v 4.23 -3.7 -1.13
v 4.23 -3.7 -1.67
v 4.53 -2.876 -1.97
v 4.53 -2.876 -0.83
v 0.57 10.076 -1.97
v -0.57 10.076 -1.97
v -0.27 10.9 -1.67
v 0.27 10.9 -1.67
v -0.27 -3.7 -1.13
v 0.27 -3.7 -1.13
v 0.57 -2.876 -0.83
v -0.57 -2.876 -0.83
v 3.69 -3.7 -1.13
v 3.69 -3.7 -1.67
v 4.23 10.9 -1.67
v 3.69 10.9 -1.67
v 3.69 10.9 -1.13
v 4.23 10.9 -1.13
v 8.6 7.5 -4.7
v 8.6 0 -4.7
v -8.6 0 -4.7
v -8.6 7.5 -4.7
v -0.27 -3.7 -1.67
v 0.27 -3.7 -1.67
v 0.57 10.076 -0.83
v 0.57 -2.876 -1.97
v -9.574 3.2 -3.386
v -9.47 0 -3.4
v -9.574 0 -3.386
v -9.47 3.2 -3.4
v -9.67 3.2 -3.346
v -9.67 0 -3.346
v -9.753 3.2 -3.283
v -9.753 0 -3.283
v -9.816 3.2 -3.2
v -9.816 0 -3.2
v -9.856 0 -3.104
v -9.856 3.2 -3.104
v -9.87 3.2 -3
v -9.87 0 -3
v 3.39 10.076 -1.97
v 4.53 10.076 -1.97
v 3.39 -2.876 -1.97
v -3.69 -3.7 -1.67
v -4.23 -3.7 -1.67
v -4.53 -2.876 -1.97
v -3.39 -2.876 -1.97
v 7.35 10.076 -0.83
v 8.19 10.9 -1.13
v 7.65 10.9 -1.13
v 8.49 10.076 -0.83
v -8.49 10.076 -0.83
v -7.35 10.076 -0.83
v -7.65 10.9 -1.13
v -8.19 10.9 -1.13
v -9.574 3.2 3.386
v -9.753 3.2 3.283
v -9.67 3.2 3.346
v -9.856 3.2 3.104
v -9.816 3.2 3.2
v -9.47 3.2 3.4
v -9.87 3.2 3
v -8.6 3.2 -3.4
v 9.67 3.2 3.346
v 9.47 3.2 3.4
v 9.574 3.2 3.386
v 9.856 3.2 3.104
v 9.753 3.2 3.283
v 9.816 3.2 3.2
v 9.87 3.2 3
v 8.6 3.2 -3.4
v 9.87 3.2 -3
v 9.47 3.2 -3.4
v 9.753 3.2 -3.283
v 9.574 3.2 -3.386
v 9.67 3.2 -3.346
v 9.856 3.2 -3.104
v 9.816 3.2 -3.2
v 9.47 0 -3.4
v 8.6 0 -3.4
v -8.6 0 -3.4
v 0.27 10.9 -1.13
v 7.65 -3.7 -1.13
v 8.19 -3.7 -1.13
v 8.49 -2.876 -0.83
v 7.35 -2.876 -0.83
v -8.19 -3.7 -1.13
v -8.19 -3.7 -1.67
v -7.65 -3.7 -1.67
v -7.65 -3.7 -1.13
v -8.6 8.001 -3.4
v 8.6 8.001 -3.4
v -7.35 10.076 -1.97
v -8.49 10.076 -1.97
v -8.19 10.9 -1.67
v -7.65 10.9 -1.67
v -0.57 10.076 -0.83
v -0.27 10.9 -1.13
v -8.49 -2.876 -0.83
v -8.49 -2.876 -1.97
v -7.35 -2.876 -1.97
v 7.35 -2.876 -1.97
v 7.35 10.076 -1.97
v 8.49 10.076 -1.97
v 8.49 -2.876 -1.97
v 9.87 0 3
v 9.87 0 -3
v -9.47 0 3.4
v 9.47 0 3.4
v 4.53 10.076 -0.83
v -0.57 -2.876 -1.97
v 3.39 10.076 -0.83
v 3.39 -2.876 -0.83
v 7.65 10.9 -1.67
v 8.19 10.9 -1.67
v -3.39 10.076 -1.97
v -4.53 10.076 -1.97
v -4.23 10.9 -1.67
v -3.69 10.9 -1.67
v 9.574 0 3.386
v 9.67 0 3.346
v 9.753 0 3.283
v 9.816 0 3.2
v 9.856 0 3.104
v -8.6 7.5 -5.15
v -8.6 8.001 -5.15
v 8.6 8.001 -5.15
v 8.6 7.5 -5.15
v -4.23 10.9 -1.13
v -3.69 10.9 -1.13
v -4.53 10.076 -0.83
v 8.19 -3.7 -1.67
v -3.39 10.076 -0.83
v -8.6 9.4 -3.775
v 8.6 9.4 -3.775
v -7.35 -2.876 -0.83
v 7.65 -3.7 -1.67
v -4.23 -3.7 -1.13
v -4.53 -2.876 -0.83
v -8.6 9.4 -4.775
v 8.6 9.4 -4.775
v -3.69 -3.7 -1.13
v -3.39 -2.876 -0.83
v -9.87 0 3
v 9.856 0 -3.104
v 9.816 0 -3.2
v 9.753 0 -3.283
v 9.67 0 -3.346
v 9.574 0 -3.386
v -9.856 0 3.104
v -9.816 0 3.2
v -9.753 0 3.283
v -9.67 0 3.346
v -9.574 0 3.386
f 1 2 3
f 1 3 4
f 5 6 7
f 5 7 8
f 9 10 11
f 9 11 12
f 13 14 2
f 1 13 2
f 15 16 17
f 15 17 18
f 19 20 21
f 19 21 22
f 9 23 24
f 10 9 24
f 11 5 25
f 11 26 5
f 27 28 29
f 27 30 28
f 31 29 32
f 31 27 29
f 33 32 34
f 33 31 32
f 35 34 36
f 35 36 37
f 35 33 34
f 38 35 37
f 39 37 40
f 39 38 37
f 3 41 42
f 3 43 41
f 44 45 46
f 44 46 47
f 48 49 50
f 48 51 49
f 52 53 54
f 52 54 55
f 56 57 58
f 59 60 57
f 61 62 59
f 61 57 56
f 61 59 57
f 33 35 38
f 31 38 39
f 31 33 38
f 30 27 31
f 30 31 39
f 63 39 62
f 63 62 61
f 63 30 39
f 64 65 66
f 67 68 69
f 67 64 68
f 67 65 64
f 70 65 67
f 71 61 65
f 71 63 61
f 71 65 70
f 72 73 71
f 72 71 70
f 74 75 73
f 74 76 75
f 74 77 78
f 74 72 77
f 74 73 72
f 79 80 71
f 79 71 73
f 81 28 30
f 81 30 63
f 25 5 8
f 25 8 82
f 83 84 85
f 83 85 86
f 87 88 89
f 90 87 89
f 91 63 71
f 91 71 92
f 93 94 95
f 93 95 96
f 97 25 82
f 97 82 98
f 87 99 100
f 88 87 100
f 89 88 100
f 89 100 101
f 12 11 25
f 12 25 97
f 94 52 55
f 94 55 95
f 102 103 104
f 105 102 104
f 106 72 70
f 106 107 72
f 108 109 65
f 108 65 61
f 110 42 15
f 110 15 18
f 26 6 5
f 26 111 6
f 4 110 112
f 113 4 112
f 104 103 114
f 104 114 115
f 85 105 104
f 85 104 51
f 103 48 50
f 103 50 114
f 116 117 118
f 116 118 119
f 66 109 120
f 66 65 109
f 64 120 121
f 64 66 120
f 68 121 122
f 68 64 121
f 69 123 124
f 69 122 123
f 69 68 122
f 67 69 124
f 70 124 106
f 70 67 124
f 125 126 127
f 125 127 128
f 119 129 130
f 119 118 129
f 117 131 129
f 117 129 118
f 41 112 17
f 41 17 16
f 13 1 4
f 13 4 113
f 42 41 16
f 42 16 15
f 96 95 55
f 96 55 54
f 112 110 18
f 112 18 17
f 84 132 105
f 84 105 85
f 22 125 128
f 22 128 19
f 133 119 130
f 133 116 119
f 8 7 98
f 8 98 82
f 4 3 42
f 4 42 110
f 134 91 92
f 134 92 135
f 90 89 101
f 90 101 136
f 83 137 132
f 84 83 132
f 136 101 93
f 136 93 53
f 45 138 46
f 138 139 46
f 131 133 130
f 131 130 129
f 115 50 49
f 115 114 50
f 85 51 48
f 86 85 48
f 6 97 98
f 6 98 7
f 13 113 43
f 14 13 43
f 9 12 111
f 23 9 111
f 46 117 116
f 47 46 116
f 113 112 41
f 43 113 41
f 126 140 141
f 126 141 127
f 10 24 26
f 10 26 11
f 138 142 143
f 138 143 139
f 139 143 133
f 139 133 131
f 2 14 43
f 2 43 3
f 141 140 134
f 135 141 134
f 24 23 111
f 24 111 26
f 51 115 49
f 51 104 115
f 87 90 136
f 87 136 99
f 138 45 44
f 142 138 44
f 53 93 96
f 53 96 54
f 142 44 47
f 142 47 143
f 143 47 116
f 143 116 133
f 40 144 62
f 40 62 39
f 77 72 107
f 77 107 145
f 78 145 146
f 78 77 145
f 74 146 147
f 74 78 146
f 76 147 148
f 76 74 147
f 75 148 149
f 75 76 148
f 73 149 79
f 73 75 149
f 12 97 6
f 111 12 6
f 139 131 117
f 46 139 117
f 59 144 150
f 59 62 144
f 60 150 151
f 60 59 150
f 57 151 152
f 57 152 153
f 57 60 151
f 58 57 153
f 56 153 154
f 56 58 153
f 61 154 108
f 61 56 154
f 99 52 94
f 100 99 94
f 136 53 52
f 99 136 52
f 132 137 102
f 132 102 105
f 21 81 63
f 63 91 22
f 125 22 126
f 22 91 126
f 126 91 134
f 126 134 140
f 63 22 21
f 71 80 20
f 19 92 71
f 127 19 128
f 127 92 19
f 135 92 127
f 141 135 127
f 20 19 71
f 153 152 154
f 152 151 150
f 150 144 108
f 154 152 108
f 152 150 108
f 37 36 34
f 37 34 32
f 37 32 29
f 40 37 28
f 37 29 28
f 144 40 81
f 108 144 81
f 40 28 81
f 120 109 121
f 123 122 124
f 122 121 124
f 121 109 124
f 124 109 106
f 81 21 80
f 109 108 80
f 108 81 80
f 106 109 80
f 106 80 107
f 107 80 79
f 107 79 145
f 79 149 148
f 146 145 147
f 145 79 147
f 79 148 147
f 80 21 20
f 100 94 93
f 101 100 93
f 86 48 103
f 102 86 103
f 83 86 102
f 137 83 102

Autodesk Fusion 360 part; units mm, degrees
sketch "Skizze1" plane through (0, 0, 0) normal (0, 1, 0) x (1, 0, 0)
  line L0 (-9.87, 3.4) -> (9.87, 3.4)
  line L1 (9.87, 3.4) -> (9.87, -3.4)
  line L2 (9.87, -3.4) -> (-9.87, -3.4)
  line L3 (-9.87, -3.4) -> (-9.87, 3.4)
  line L4 (0, 3.4) -> (0, -3.4) construction
  dimension "d9" = 19.74
  dimension "d10" = 6.8
extrude "Extrusion1" add sketch "Skizze1" along normal blind 3.2 makes body 1
sketch "Skizze3" plane through (0, 0, 0) normal (1, 0, 0) x (0, 0, -1)
  line L0 (3.4, 0) -> (3.4, 3.2)
  line L1 (3.4, 0) -> (4.7, 0)
  line L2 (4.7, 0) -> (4.7, 9.4)
  line L3 (4.7, 9.4) -> (3.4, 9.4) construction
  line L4 (3.4, 9.4) -> (3.4, 0)
  line L5 (4.7, 9.4) -> (5.15, 9.4)
  line L6 (5.15, 9.4) -> (5.15, 0)
  line L7 (5.15, 0) -> (4.7, 0)
  line L8 (4.7, 0) -> (4.7, 9.4) construction
  line L9 (3.4, 8.0005) -> (3.775, 9.4)
  line L10 (4.775, 9.4) -> (5.15, 8.0005)
  line L11 (5.15, 7.5005) -> (4.7, 7.5005)
  line L12 (4.775, 9.4) -> (3.775, 9.4)
  line L13 (3.775, 9.4) -> (4.775, 9.4) construction
  line L14 (4.775, 9.4) -> (5.15, 9.4) construction
  line L15 (3.775, 9.4) -> (3.4, 9.4) construction
  line L16 (5.15, 9.4) -> (4.775, 9.4) construction
  line L17 (5.15, 8.0005) -> (5.15, 7.5005) construction
  line L18 (5.15, 7.5005) -> (5.15, 8.0005) construction
  line L19 (5.15, 9.4) -> (3.4, 9.4)
  line L20 (5.15, 0) -> (3.4, 0)
  dimension "d31" = 9.4
  dimension "d33" = 1.3
  dimension "d35" = 90
  dimension "d36" = 75
  dimension "d37" = 75
  dimension "d39" = 1
  dimension "d42" = 0.5
  dimension "d48" = 1.75
sketch "Skizze2" plane through (0, 0, 0) normal (0, 1, 0) x (1, 0, 0)
  line L0 (-7.35, 0.83) -> (-8.49, 0.83)
  line L1 (-8.49, 0.83) -> (-8.49, 1.97)
  line L2 (-8.49, 1.97) -> (-7.35, 1.97)
  line L3 (-7.35, 1.97) -> (-7.35, 0.83)
  line L4 (-9.87, 3.4) -> (9.87, 3.4)
  line L5 (9.87, 3.4) -> (9.87, -3.4)
  line L6 (9.87, -3.4) -> (-9.87, -3.4)
  line L7 (-9.87, -3.4) -> (-9.87, 3.4)
  line L8 (0, 3.4) -> (0, 1.4) construction
  line L9 (-7.35, 1.4) -> (-8.49, 1.4) construction
  line L10 (0, 1.4) -> (-7.92, 1.4)
  point P0 (-7.92, 1.4)
  dimension "d16" = 1.14
  dimension "d17" = 1.14
  dimension "d24" = 2
  dimension "d26" = 7.92
extrude "Extrusion3" add sketch "Skizze3" along normal mid plane 17.2 contours L0 L1 L2 L4 L9 L12 L19 L20 | L2 L5 L6 L10 L11 L12 L19 bodies 1
extrude "Extrusion2" add sketch "Skizze2" along normal blind 10.9 and the other way blind 3.7 separate body contours L0 L1 L2 L3 makes body 2
chamfer "Fase2" distance 0.3 angle 70 8 edges at (-7.92, 10.9, -0.83) (-7.35, 10.9, -1.4) (-7.92, 10.9, -1.97) (-8.49, 10.9, -1.4) (-7.35, -3.7, -1.4) (-7.92, -3.7, -0.83) (-8.49, -3.7, -1.4) (-7.92, -3.7, -1.97) measured on face at (-8.11, 10.9, -1.21) measured on face at (-8.11, 10.9, -1.21) measured on face at (-8.11, 10.9, -1.21) measured on face at (-8.11, 10.9, -1.21) measured on face at (-8.11, -3.7, -1.21) measured on face at (-8.11, -3.7, -1.21) measured on face at (-8.11, -3.7, -1.21) measured on face at (-8.11, -3.7, -1.21) on bodies 2
pattern_linear "R-Anordnung1" count 5 spacing 3.96 along (1, 0, 0) of bodies 2 makes body 3 at (-4.15, 5.7586, -0.83) makes body 4 at (-0.19, 5.7586, -0.83) makes body 5 at (3.77, 5.7586, -0.83) makes body 6 at (8.11, 1.4414, -0.83)
fillet "Abrundung1" radius 0.4 4 edges at (9.87, 1.6, -3.4) (9.87, 1.6, 3.4) (-9.87, 1.6, 3.4) (-9.87, 1.6, -3.4) on bodies 1
equation "n = 5" comment "Number of pins"
equation "P = 3.96 mm" comment "Pin pitch"
equation "B1 = A1 + ( 1.95 mm * 2 )" comment "Width of bottom plate"
equation "A1 = ( n - 1 ) * P" comment "Total width of all pins"
equation "C1 = 6.8 mm" comment "Height of bottom plate"
equation "H1 = 9.4 mm" comment "Height of latching plate"
equation "O1 = 2 mm" comment "Vertical offset pin-center to bottom plate border"
equation "d9 = B1"
equation "d10 = C1"
equation "D1 = 3.2 mm" comment "Total depth of bottom plate"
equation "Pw = 1.14 mm" comment "Width & height of square pin"
equation "d13 = D1"
equation "d16 = Pw"
equation "d17 = Pw"
equation "LPinTop = 7.7 mm + D1" comment "Length of the pin measured from the bottom plane to the top of the pin (away from PCB)"
equation "LPinBottom = 14.6 mm - LPinTop" comment "Length of the pin in bottom direction, measured from the bottom plane"
equation "d20 = LPinTop"
equation "d22 = LPinBottom"
equation "d24 = O1"
equation "Pin1XOffset = ( ( n - 1 ) * P ) / 2" comment "First pin X offset measured from the X axis"
equation "d26 = Pin1XOffset"
equation "d27 = n"
equation "d29 = P"
equation "d31 = H1"
equation "D2 = 1.3 mm" comment "(Measured) depth of latching plate (narrowest section)"
equation "d33 = D2"
equation "d35 = alpha"
equation "d36 = 90 deg - beta"
equation "d37 = 90 deg - beta"
equation "Wx1 = 1.0 mm" comment "(Measured) Width of the topmost part of the latching plate"
equation "Hx1 = 0.5 mm" comment "(Measured) Height of the latching surface facing away from the pins"
equation "alpha = 90 deg" comment "Angle of the latching surface. Shown by the datasheet as ~45°but real parts have 90°"
equation "d42 = Hx1"
equation "beta = 15 deg" comment "(Estimated) Latching plate tapering angle"
equation "WL1 = 1.27 mm" comment "(Measured) With of the section of the bottom plate where there is no latching plate per side)"
equation "d45 = B1 - ( WL1 * 2 )"
equation "Dlatch = 1.75 mm" comment "(Measured) Total depth of latching plate"
equation "d48 = Dlatch"
equation "d54 = delta"
equation "delta = 70 deg" comment "(Estimated) Taper angle of the pin top & bottoms"
